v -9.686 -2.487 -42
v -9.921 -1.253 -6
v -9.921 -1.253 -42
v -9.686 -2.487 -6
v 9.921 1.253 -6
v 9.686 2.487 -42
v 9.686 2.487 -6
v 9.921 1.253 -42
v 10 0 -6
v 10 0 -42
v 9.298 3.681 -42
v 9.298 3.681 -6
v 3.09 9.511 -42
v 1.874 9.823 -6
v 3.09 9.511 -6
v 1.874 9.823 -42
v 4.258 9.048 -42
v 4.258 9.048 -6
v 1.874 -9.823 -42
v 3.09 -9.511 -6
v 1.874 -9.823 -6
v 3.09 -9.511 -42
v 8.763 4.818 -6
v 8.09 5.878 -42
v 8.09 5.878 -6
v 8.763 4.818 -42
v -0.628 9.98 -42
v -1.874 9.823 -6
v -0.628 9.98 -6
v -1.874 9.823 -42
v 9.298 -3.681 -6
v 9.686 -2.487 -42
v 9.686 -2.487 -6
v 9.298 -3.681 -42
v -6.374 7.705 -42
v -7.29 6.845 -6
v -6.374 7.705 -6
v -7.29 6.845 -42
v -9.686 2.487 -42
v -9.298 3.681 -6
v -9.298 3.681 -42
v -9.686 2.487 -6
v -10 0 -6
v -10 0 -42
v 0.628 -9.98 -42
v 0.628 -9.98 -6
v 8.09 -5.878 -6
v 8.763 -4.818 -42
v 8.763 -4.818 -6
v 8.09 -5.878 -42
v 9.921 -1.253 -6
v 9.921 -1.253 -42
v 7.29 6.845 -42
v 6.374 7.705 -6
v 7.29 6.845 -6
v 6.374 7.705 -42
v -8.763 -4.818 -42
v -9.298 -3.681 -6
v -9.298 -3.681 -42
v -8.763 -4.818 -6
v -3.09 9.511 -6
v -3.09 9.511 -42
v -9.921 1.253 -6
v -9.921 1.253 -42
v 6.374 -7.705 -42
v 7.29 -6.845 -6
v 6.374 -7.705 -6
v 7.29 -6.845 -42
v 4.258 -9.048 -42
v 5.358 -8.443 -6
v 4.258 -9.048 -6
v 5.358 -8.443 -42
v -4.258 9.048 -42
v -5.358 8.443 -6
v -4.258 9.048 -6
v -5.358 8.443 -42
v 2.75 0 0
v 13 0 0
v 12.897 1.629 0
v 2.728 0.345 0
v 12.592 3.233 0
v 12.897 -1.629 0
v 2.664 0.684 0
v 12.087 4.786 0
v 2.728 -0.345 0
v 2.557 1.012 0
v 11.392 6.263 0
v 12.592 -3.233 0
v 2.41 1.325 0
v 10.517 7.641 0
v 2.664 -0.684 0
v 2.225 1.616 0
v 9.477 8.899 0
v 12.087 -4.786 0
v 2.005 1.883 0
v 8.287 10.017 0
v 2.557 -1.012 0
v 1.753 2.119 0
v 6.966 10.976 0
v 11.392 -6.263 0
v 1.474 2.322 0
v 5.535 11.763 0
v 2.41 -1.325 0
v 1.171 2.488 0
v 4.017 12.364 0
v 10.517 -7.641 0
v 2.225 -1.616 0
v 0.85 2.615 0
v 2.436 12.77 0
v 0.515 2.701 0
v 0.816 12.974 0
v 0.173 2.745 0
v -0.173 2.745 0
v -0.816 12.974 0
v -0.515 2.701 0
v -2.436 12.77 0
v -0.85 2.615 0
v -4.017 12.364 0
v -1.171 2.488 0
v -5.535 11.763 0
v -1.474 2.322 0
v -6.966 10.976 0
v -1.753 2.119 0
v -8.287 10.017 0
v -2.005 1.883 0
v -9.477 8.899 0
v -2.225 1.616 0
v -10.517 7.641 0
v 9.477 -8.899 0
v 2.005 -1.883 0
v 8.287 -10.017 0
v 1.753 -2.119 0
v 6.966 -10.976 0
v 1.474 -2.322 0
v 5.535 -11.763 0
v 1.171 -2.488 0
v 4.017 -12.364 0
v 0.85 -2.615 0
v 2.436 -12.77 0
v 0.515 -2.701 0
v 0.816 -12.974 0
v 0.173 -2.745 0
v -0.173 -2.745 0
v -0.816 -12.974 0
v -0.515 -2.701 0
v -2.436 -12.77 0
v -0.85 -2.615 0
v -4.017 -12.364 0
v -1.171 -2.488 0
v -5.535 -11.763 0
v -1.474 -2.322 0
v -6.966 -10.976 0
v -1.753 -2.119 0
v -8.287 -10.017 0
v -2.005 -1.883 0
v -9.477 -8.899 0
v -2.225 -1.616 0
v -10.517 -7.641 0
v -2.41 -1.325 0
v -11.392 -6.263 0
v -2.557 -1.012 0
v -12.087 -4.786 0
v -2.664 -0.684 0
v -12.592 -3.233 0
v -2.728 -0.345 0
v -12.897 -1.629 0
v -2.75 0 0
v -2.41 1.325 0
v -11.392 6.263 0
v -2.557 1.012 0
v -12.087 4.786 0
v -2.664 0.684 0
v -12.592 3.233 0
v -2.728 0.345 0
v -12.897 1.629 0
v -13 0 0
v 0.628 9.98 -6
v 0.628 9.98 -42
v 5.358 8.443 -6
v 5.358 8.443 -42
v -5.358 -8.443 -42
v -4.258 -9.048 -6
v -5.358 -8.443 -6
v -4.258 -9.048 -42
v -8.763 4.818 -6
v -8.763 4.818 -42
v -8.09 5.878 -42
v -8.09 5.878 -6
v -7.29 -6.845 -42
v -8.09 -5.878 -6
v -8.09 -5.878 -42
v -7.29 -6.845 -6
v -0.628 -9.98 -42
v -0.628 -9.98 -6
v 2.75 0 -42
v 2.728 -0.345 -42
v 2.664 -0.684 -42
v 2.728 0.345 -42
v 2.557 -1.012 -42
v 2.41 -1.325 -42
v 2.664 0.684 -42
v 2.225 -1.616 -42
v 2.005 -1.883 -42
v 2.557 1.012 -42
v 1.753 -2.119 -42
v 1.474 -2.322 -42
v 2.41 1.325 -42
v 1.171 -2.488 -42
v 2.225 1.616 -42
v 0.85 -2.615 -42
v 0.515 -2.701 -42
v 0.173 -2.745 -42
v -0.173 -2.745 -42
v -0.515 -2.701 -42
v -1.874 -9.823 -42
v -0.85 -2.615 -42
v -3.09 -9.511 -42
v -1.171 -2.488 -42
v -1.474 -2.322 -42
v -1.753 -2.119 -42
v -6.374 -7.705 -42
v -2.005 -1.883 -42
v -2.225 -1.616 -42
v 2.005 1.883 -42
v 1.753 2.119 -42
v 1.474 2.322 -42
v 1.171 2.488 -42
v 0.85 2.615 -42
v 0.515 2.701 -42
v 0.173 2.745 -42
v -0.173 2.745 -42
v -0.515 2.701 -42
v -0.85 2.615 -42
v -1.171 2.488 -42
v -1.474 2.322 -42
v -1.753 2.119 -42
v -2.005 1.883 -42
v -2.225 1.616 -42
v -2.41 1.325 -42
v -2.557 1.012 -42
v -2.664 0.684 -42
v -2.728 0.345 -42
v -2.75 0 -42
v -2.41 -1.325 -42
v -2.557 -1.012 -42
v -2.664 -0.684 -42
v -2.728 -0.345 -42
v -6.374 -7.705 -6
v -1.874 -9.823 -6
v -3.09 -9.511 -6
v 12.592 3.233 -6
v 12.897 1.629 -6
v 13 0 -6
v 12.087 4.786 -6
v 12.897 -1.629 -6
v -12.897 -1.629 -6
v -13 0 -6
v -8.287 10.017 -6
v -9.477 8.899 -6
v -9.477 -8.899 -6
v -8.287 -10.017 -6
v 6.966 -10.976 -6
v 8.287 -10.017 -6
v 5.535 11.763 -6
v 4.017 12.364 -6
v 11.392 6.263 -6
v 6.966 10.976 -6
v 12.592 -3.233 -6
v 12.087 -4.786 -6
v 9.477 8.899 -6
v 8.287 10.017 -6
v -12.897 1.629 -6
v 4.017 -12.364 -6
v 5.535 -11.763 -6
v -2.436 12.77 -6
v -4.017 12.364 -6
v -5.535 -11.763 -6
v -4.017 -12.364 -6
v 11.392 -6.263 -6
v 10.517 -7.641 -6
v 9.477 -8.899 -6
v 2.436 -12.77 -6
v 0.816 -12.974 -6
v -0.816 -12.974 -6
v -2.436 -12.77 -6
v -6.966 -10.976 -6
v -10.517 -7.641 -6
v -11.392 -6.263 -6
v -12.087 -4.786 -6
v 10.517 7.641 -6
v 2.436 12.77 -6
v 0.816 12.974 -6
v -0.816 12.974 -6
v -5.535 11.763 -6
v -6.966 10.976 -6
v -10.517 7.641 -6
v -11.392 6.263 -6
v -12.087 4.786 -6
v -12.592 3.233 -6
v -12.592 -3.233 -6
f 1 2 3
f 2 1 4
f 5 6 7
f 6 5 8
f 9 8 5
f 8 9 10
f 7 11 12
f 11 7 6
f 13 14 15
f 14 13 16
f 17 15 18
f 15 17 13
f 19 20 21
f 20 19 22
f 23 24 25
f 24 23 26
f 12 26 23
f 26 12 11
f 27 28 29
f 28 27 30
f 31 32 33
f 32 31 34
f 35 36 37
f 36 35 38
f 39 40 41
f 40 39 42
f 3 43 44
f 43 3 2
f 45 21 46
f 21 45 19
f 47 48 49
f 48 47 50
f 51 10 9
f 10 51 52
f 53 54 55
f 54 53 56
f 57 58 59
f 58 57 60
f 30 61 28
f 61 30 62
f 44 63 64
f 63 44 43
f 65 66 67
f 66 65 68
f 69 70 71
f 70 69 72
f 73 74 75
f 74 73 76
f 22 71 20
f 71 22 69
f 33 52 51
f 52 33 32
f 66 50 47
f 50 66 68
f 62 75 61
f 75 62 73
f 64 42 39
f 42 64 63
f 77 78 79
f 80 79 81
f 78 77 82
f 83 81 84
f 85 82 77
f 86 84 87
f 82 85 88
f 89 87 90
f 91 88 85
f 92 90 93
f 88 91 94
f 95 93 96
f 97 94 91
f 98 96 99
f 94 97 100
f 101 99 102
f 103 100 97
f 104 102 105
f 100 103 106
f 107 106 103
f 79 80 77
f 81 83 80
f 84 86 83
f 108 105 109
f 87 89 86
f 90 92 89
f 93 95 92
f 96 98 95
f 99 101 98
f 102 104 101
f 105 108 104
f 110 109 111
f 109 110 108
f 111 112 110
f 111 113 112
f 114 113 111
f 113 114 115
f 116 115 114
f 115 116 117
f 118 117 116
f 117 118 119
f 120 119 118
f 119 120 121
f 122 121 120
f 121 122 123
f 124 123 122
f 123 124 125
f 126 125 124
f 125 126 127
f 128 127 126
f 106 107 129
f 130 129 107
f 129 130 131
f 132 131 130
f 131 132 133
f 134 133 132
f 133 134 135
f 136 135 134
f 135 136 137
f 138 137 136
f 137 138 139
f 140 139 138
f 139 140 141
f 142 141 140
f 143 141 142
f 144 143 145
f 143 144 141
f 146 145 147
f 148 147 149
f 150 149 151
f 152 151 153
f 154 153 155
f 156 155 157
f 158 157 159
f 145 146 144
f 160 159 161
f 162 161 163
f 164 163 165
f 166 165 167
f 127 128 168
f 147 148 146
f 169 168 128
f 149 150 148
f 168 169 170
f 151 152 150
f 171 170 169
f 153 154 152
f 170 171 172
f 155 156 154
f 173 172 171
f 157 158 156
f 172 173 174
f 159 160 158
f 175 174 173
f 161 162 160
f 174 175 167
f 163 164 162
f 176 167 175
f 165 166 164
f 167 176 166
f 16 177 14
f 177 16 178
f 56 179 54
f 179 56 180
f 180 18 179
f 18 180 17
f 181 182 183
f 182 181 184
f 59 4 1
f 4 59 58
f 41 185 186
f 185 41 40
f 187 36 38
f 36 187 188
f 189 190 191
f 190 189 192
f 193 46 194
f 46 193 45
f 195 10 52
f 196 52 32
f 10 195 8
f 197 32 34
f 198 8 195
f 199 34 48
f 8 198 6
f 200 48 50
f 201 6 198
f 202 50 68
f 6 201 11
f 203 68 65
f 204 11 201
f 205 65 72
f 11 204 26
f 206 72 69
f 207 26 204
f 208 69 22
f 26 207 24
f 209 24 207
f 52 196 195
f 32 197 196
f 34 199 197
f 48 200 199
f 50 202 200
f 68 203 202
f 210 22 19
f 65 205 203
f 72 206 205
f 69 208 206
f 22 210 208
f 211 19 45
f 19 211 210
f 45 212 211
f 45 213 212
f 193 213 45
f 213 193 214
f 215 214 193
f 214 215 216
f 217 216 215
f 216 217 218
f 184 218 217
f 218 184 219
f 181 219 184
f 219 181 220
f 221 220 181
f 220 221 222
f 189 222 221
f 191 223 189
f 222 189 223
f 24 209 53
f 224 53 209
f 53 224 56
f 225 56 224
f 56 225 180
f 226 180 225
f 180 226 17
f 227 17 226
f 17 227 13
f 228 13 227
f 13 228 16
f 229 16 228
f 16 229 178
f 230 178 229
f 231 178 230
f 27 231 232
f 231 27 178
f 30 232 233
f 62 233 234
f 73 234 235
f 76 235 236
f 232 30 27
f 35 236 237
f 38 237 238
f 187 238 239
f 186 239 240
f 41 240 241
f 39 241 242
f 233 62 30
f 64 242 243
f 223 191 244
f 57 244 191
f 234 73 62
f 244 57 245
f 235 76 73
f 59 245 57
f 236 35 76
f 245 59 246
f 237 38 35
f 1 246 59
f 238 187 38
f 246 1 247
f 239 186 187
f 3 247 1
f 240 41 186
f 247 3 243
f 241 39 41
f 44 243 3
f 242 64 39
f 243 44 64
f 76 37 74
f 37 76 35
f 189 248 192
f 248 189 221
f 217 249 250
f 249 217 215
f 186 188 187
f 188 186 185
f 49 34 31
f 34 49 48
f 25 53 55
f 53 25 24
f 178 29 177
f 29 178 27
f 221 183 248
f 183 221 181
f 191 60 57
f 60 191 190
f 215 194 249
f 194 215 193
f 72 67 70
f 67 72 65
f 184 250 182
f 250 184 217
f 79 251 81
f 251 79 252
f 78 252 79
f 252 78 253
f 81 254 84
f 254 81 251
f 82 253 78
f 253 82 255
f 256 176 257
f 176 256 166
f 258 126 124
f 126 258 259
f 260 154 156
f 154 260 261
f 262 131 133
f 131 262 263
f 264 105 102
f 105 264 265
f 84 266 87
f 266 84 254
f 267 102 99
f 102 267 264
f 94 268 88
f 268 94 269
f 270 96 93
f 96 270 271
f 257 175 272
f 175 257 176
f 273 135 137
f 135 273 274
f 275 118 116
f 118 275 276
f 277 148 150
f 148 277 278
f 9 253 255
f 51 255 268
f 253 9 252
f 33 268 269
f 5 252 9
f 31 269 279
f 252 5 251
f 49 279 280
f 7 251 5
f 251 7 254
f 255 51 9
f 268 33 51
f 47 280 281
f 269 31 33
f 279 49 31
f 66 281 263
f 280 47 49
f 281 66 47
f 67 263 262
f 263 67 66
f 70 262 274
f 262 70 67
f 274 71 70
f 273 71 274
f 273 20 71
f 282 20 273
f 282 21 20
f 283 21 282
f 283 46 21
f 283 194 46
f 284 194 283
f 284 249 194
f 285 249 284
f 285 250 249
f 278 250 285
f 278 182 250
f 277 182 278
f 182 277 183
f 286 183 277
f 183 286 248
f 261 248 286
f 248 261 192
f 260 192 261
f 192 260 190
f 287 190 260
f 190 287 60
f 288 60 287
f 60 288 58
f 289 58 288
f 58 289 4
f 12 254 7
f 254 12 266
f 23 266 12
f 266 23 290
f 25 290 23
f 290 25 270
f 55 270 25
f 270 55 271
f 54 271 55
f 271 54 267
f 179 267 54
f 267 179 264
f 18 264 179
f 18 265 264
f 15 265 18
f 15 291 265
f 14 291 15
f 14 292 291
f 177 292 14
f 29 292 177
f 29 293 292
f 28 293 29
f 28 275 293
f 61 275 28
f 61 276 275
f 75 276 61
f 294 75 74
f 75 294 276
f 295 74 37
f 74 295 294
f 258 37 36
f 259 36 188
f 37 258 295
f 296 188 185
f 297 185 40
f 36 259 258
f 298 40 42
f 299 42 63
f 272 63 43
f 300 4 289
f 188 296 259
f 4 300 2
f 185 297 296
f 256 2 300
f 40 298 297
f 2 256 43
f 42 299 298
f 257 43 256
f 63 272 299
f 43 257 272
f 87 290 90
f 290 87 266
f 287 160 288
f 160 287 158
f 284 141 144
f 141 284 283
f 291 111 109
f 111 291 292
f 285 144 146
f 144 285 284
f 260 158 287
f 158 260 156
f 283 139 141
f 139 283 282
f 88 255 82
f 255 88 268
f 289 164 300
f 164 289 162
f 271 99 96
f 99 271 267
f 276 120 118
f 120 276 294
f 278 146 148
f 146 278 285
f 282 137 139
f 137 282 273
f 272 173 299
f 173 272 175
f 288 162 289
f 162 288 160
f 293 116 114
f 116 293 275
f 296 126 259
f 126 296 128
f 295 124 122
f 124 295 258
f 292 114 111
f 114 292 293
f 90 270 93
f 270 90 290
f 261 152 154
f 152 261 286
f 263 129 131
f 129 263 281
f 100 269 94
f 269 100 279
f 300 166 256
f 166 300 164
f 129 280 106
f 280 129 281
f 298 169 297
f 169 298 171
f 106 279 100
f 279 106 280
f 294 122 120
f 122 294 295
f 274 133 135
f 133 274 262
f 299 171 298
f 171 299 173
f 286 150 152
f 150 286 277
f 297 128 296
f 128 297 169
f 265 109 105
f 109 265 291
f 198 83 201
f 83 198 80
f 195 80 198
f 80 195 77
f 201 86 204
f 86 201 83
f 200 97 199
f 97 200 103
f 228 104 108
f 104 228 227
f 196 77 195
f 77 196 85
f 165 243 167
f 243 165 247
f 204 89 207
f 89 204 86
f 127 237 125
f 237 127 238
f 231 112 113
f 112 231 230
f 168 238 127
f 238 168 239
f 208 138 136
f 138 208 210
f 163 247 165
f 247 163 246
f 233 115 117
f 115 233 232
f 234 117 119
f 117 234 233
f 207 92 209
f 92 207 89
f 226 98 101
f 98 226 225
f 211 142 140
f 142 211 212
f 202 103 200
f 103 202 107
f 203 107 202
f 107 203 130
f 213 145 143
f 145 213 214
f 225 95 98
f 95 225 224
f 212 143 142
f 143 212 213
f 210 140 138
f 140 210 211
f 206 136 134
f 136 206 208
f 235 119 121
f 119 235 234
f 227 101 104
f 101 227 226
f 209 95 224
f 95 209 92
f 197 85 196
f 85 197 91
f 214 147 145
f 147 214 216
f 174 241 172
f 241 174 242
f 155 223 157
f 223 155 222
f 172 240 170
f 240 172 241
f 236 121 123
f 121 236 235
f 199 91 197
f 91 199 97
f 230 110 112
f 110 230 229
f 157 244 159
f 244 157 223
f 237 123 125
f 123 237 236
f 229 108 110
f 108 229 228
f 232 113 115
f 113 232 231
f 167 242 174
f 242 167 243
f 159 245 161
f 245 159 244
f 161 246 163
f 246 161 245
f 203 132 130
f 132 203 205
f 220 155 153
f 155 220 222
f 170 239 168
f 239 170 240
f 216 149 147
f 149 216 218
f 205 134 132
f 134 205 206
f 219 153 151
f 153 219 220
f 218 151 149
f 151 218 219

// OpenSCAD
$fn = 50;


difference() {
	union() {
		translate(v = [0, 0, -42.0000000000]) {
			cylinder(h = 42, r = 10.0000000000);
		}
		translate(v = [0, 0, -6.0000000000]) {
			cylinder(h = 6, r = 13.0000000000);
		}
	}
	union() {
		#translate(v = [0, 0, -42]) {
			cylinder(h = 42, r = 2.7500000000);
		}
	}
}
